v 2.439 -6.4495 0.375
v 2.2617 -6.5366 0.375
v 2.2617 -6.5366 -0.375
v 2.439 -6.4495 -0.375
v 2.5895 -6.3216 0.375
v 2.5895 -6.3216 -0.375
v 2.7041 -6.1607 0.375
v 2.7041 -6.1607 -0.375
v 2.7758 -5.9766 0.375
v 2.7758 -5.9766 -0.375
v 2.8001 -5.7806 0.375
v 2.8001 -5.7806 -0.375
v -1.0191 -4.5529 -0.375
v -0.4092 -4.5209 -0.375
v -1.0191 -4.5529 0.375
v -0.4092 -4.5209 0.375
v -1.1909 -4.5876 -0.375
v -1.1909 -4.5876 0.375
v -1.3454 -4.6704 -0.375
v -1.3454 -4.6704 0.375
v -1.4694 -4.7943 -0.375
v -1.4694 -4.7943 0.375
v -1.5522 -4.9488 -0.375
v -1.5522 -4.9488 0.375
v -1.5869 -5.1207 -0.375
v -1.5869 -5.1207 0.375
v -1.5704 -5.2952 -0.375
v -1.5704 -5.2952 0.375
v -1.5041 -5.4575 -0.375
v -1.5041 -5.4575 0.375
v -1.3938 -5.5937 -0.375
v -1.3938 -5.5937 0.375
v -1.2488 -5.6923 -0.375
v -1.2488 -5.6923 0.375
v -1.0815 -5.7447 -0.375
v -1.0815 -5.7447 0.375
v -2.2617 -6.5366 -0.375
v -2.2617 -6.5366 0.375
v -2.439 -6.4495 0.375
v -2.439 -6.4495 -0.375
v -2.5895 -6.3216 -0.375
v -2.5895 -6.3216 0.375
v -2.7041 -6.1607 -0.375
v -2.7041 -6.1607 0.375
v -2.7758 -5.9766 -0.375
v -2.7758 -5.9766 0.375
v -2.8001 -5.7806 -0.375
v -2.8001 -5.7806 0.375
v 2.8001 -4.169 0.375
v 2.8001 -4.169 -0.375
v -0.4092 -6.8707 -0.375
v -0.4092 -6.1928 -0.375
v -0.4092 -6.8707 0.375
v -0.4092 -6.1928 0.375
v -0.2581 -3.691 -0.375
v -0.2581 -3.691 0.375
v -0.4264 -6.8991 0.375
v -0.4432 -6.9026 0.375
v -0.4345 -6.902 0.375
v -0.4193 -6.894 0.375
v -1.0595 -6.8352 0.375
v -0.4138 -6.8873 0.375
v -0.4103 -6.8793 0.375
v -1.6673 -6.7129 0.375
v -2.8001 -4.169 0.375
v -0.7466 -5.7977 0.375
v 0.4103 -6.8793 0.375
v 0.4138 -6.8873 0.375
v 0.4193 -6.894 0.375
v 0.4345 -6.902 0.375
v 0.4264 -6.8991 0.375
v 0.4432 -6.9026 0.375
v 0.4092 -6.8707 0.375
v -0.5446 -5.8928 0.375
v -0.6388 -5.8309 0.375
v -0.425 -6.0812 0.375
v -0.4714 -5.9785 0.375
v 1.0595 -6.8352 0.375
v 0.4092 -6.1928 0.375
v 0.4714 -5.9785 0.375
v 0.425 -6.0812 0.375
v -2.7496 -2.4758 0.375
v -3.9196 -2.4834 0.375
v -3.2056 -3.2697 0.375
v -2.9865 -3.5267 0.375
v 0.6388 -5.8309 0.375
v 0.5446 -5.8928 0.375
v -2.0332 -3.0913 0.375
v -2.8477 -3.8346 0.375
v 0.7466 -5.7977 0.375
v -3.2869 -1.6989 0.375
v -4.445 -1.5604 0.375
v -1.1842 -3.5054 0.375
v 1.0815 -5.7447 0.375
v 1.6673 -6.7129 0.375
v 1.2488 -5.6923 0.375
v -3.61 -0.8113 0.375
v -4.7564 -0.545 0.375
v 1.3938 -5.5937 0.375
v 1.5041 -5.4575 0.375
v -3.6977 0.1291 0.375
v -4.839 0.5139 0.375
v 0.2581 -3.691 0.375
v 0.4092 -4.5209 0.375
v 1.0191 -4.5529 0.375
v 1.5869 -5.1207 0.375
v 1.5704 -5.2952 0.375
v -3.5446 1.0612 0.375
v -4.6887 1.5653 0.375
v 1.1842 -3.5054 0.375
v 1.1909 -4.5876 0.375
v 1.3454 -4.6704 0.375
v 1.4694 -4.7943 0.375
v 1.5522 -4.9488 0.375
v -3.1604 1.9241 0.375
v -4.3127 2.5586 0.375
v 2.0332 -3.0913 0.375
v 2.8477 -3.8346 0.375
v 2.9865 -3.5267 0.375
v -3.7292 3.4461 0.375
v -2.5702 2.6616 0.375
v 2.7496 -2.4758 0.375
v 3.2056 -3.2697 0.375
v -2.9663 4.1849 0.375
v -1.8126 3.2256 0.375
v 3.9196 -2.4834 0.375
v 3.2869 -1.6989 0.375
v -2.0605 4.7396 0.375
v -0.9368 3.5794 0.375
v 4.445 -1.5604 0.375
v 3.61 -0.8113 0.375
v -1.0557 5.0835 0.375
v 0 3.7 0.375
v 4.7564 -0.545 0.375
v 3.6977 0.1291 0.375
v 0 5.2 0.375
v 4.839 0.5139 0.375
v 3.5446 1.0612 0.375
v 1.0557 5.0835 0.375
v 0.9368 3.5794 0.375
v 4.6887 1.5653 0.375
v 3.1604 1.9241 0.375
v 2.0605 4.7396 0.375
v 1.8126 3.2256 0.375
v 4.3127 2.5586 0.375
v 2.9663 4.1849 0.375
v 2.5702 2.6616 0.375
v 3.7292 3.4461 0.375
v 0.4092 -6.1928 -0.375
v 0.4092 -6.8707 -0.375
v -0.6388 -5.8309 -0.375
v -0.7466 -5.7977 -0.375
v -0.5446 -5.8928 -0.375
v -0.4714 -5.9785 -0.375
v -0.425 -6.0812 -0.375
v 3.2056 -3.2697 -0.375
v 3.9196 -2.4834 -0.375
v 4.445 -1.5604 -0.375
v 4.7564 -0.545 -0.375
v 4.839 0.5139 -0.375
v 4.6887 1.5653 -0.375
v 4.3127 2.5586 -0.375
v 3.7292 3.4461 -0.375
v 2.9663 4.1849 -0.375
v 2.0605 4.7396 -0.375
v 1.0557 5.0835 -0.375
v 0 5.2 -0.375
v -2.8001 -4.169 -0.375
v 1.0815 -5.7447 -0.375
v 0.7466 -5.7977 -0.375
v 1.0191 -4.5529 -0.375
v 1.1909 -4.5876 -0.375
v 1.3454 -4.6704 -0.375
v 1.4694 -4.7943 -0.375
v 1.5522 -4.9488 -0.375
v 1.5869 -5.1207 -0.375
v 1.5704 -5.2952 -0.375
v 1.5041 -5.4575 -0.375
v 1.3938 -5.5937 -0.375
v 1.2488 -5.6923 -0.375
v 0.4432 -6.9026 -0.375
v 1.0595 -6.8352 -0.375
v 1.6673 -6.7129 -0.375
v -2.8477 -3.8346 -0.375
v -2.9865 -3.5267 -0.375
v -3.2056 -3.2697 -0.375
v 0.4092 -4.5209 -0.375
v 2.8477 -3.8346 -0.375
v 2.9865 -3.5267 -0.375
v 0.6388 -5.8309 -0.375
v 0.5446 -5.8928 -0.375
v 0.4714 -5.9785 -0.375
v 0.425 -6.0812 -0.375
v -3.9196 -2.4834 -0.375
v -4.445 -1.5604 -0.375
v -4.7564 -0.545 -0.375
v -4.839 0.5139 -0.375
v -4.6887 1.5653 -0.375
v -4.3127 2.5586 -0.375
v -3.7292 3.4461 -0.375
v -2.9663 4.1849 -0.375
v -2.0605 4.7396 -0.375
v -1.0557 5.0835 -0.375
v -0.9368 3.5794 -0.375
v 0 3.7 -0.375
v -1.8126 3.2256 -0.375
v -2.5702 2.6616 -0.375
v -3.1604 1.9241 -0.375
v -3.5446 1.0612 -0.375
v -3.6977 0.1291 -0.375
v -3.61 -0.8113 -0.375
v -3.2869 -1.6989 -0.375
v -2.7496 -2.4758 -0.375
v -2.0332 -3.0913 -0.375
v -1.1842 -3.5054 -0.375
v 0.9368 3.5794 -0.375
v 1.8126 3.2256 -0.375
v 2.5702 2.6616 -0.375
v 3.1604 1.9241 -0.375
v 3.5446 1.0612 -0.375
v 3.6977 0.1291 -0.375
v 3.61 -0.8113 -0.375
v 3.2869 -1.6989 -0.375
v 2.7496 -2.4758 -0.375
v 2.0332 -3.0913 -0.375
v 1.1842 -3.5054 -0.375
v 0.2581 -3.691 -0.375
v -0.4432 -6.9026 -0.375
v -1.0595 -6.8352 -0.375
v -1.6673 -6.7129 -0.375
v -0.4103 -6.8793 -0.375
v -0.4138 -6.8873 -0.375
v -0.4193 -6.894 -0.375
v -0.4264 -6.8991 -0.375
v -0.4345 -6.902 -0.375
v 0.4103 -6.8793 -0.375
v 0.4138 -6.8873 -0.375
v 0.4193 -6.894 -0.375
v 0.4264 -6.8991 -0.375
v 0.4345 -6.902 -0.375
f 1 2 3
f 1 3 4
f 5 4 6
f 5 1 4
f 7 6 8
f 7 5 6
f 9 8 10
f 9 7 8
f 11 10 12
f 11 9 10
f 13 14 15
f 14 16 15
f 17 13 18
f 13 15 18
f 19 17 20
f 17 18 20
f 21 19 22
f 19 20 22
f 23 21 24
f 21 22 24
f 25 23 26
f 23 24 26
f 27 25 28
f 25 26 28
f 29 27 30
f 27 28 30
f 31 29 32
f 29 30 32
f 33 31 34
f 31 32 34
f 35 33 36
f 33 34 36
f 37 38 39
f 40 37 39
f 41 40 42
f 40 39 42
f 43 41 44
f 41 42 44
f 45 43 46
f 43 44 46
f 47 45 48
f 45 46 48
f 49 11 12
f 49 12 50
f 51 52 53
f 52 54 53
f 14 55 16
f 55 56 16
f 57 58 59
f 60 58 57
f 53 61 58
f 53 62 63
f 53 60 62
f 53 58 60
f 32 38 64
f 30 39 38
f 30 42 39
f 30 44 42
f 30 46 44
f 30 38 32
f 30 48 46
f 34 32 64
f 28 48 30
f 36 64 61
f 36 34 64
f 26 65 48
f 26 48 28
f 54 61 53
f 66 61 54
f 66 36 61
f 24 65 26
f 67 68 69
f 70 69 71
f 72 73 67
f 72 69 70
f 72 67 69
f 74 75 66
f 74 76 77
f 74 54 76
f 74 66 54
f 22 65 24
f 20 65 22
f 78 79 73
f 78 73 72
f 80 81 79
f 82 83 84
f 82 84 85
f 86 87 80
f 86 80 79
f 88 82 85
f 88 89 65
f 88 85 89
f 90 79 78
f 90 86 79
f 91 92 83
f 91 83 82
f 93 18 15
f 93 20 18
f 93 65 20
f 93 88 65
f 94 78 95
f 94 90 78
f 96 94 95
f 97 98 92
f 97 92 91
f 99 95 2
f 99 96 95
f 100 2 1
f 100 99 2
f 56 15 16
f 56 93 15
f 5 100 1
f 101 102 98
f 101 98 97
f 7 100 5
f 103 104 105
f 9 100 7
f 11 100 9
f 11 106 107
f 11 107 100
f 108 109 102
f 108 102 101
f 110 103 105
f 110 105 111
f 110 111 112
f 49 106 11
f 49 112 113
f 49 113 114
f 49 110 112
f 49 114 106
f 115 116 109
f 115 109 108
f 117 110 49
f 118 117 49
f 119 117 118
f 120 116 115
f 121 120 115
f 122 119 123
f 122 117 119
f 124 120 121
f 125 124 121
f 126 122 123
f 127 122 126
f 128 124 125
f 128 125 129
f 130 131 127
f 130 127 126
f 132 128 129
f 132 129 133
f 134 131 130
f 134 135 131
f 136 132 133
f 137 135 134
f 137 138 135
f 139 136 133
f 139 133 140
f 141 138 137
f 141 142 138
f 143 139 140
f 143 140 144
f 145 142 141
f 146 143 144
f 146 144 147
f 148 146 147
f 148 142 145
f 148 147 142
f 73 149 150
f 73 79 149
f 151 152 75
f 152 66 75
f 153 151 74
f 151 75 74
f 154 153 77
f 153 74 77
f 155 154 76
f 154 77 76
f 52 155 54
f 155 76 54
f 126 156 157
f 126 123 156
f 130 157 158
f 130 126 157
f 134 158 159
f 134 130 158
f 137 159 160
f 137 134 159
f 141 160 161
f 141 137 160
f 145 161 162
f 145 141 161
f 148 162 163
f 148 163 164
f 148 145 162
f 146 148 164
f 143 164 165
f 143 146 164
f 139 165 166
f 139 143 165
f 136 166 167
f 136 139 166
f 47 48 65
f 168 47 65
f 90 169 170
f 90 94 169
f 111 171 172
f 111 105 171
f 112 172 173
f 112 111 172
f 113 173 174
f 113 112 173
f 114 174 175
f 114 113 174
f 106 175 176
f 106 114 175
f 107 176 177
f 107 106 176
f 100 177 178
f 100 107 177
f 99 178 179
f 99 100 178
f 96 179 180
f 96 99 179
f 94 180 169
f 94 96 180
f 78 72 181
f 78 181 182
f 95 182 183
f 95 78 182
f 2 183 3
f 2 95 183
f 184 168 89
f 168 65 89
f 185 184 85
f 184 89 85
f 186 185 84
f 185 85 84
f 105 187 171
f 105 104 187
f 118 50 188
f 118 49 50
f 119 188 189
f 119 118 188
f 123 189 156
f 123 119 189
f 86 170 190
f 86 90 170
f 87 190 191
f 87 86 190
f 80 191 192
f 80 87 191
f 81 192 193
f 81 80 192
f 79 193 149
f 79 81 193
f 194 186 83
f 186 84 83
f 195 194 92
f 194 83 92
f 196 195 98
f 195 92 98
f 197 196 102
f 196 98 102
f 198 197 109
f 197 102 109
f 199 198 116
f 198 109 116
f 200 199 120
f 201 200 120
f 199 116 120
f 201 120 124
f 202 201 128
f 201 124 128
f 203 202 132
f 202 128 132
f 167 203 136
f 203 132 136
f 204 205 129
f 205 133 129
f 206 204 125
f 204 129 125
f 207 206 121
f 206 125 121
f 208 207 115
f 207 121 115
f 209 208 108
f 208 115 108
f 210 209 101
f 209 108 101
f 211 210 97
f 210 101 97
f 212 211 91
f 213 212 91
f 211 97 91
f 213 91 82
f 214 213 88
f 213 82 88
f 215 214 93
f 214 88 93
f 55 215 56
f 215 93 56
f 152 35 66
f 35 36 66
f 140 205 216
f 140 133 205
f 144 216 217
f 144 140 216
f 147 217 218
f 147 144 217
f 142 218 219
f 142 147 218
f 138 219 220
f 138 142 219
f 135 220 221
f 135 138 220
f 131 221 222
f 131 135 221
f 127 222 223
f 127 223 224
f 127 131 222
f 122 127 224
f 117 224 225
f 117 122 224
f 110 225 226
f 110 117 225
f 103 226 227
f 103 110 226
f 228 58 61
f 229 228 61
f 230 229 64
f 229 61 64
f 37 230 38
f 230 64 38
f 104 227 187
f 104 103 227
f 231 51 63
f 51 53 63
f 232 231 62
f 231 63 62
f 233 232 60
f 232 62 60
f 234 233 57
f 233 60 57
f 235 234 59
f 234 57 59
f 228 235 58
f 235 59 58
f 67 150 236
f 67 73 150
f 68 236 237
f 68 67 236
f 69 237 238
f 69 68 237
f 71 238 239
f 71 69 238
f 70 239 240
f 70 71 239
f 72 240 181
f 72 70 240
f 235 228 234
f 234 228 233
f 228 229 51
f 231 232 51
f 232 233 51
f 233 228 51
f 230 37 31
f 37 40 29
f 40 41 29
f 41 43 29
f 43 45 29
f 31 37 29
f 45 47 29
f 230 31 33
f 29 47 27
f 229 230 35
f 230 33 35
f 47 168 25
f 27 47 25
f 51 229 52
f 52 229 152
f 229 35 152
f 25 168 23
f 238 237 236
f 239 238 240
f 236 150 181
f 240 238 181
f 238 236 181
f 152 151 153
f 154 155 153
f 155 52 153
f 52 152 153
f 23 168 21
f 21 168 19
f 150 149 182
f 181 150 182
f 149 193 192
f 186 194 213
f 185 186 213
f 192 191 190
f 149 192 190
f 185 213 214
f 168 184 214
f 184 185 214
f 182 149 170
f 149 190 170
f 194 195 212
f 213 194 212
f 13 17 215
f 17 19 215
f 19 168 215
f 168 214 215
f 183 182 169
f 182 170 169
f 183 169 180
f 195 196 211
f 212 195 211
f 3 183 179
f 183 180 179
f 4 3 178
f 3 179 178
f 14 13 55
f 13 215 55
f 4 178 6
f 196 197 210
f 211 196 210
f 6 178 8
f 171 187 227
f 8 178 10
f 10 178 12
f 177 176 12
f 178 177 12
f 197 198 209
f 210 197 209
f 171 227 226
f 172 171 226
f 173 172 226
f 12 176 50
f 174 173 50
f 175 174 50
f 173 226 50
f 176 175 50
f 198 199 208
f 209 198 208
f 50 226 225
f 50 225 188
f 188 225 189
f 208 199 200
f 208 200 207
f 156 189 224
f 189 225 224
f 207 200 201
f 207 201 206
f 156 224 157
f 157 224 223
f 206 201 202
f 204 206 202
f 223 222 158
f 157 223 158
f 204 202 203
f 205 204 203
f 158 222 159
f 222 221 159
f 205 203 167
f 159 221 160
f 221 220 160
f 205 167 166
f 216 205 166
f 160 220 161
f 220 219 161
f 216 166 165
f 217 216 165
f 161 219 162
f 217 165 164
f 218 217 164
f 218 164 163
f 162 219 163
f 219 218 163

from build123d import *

# Parameters (mm, degrees)
BOSS_EXTRUDE1_DEPTH = 0.375


with BuildPart() as part:
    # Sketch3 → Boss-Extrude1 (new, symmetric)
    with BuildSketch(Plane.XY):
        with BuildLine():
            Line((-2.800142094, -5.780594647), (-2.800142094, -4.16896088))
            ThreePointArc((-2.800142094, -4.16896088), (-2.906194065, -3.675728978), (-3.205604942, -3.269677435))
            ThreePointArc((-3.205604942, -3.269677435), (-4.528005601, 2.072292656), (0, 5.2))
            Line((0, 5.2), (0, 3.7))
            ThreePointArc((0, 3.7), (-3.69774606, 0.129128138), (-0.258098953, -3.690986986))
            Line((-0.258098953, -3.690986986), (-0.409154928, -4.520936126))
            Line((-0.409154928, -4.520936126), (-1.019085782, -4.552901247))
            ThreePointArc((-1.019085782, -4.552901247), (-1.586861929, -5.120677394), (-1.081544887, -5.744691972))
            Line((-1.081544887, -5.744691972), (-0.746581142, -5.797745018))
            ThreePointArc((-0.746581142, -5.797745018), (-0.504992542, -5.933041134), (-0.409154928, -6.192820354))
            Line((-0.409154928, -6.192820354), (-0.409154928, -6.870700795))
            ThreePointArc((-0.409154928, -6.870700795), (-0.419264451, -6.894041896), (-0.443205367, -6.902635035))
            ThreePointArc((-0.443205367, -6.902635035), (-1.364795043, -6.780865425), (-2.261733258, -6.536617175))
            ThreePointArc((-2.261733258, -6.536617175), (-2.651783457, -6.244667416), (-2.800142094, -5.780594647))
        make_face()
    extrude(amount=BOSS_EXTRUDE1_DEPTH, both=True)

    # Mirror1: part across plane


with BuildPart() as part_1:
    add(part.part)
    add(part.part.mirror(Plane(origin=(0, 5.2, 0.375), x_dir=(0, 0, 1), z_dir=(-1, 0, 0))))


solid = part_1.part
